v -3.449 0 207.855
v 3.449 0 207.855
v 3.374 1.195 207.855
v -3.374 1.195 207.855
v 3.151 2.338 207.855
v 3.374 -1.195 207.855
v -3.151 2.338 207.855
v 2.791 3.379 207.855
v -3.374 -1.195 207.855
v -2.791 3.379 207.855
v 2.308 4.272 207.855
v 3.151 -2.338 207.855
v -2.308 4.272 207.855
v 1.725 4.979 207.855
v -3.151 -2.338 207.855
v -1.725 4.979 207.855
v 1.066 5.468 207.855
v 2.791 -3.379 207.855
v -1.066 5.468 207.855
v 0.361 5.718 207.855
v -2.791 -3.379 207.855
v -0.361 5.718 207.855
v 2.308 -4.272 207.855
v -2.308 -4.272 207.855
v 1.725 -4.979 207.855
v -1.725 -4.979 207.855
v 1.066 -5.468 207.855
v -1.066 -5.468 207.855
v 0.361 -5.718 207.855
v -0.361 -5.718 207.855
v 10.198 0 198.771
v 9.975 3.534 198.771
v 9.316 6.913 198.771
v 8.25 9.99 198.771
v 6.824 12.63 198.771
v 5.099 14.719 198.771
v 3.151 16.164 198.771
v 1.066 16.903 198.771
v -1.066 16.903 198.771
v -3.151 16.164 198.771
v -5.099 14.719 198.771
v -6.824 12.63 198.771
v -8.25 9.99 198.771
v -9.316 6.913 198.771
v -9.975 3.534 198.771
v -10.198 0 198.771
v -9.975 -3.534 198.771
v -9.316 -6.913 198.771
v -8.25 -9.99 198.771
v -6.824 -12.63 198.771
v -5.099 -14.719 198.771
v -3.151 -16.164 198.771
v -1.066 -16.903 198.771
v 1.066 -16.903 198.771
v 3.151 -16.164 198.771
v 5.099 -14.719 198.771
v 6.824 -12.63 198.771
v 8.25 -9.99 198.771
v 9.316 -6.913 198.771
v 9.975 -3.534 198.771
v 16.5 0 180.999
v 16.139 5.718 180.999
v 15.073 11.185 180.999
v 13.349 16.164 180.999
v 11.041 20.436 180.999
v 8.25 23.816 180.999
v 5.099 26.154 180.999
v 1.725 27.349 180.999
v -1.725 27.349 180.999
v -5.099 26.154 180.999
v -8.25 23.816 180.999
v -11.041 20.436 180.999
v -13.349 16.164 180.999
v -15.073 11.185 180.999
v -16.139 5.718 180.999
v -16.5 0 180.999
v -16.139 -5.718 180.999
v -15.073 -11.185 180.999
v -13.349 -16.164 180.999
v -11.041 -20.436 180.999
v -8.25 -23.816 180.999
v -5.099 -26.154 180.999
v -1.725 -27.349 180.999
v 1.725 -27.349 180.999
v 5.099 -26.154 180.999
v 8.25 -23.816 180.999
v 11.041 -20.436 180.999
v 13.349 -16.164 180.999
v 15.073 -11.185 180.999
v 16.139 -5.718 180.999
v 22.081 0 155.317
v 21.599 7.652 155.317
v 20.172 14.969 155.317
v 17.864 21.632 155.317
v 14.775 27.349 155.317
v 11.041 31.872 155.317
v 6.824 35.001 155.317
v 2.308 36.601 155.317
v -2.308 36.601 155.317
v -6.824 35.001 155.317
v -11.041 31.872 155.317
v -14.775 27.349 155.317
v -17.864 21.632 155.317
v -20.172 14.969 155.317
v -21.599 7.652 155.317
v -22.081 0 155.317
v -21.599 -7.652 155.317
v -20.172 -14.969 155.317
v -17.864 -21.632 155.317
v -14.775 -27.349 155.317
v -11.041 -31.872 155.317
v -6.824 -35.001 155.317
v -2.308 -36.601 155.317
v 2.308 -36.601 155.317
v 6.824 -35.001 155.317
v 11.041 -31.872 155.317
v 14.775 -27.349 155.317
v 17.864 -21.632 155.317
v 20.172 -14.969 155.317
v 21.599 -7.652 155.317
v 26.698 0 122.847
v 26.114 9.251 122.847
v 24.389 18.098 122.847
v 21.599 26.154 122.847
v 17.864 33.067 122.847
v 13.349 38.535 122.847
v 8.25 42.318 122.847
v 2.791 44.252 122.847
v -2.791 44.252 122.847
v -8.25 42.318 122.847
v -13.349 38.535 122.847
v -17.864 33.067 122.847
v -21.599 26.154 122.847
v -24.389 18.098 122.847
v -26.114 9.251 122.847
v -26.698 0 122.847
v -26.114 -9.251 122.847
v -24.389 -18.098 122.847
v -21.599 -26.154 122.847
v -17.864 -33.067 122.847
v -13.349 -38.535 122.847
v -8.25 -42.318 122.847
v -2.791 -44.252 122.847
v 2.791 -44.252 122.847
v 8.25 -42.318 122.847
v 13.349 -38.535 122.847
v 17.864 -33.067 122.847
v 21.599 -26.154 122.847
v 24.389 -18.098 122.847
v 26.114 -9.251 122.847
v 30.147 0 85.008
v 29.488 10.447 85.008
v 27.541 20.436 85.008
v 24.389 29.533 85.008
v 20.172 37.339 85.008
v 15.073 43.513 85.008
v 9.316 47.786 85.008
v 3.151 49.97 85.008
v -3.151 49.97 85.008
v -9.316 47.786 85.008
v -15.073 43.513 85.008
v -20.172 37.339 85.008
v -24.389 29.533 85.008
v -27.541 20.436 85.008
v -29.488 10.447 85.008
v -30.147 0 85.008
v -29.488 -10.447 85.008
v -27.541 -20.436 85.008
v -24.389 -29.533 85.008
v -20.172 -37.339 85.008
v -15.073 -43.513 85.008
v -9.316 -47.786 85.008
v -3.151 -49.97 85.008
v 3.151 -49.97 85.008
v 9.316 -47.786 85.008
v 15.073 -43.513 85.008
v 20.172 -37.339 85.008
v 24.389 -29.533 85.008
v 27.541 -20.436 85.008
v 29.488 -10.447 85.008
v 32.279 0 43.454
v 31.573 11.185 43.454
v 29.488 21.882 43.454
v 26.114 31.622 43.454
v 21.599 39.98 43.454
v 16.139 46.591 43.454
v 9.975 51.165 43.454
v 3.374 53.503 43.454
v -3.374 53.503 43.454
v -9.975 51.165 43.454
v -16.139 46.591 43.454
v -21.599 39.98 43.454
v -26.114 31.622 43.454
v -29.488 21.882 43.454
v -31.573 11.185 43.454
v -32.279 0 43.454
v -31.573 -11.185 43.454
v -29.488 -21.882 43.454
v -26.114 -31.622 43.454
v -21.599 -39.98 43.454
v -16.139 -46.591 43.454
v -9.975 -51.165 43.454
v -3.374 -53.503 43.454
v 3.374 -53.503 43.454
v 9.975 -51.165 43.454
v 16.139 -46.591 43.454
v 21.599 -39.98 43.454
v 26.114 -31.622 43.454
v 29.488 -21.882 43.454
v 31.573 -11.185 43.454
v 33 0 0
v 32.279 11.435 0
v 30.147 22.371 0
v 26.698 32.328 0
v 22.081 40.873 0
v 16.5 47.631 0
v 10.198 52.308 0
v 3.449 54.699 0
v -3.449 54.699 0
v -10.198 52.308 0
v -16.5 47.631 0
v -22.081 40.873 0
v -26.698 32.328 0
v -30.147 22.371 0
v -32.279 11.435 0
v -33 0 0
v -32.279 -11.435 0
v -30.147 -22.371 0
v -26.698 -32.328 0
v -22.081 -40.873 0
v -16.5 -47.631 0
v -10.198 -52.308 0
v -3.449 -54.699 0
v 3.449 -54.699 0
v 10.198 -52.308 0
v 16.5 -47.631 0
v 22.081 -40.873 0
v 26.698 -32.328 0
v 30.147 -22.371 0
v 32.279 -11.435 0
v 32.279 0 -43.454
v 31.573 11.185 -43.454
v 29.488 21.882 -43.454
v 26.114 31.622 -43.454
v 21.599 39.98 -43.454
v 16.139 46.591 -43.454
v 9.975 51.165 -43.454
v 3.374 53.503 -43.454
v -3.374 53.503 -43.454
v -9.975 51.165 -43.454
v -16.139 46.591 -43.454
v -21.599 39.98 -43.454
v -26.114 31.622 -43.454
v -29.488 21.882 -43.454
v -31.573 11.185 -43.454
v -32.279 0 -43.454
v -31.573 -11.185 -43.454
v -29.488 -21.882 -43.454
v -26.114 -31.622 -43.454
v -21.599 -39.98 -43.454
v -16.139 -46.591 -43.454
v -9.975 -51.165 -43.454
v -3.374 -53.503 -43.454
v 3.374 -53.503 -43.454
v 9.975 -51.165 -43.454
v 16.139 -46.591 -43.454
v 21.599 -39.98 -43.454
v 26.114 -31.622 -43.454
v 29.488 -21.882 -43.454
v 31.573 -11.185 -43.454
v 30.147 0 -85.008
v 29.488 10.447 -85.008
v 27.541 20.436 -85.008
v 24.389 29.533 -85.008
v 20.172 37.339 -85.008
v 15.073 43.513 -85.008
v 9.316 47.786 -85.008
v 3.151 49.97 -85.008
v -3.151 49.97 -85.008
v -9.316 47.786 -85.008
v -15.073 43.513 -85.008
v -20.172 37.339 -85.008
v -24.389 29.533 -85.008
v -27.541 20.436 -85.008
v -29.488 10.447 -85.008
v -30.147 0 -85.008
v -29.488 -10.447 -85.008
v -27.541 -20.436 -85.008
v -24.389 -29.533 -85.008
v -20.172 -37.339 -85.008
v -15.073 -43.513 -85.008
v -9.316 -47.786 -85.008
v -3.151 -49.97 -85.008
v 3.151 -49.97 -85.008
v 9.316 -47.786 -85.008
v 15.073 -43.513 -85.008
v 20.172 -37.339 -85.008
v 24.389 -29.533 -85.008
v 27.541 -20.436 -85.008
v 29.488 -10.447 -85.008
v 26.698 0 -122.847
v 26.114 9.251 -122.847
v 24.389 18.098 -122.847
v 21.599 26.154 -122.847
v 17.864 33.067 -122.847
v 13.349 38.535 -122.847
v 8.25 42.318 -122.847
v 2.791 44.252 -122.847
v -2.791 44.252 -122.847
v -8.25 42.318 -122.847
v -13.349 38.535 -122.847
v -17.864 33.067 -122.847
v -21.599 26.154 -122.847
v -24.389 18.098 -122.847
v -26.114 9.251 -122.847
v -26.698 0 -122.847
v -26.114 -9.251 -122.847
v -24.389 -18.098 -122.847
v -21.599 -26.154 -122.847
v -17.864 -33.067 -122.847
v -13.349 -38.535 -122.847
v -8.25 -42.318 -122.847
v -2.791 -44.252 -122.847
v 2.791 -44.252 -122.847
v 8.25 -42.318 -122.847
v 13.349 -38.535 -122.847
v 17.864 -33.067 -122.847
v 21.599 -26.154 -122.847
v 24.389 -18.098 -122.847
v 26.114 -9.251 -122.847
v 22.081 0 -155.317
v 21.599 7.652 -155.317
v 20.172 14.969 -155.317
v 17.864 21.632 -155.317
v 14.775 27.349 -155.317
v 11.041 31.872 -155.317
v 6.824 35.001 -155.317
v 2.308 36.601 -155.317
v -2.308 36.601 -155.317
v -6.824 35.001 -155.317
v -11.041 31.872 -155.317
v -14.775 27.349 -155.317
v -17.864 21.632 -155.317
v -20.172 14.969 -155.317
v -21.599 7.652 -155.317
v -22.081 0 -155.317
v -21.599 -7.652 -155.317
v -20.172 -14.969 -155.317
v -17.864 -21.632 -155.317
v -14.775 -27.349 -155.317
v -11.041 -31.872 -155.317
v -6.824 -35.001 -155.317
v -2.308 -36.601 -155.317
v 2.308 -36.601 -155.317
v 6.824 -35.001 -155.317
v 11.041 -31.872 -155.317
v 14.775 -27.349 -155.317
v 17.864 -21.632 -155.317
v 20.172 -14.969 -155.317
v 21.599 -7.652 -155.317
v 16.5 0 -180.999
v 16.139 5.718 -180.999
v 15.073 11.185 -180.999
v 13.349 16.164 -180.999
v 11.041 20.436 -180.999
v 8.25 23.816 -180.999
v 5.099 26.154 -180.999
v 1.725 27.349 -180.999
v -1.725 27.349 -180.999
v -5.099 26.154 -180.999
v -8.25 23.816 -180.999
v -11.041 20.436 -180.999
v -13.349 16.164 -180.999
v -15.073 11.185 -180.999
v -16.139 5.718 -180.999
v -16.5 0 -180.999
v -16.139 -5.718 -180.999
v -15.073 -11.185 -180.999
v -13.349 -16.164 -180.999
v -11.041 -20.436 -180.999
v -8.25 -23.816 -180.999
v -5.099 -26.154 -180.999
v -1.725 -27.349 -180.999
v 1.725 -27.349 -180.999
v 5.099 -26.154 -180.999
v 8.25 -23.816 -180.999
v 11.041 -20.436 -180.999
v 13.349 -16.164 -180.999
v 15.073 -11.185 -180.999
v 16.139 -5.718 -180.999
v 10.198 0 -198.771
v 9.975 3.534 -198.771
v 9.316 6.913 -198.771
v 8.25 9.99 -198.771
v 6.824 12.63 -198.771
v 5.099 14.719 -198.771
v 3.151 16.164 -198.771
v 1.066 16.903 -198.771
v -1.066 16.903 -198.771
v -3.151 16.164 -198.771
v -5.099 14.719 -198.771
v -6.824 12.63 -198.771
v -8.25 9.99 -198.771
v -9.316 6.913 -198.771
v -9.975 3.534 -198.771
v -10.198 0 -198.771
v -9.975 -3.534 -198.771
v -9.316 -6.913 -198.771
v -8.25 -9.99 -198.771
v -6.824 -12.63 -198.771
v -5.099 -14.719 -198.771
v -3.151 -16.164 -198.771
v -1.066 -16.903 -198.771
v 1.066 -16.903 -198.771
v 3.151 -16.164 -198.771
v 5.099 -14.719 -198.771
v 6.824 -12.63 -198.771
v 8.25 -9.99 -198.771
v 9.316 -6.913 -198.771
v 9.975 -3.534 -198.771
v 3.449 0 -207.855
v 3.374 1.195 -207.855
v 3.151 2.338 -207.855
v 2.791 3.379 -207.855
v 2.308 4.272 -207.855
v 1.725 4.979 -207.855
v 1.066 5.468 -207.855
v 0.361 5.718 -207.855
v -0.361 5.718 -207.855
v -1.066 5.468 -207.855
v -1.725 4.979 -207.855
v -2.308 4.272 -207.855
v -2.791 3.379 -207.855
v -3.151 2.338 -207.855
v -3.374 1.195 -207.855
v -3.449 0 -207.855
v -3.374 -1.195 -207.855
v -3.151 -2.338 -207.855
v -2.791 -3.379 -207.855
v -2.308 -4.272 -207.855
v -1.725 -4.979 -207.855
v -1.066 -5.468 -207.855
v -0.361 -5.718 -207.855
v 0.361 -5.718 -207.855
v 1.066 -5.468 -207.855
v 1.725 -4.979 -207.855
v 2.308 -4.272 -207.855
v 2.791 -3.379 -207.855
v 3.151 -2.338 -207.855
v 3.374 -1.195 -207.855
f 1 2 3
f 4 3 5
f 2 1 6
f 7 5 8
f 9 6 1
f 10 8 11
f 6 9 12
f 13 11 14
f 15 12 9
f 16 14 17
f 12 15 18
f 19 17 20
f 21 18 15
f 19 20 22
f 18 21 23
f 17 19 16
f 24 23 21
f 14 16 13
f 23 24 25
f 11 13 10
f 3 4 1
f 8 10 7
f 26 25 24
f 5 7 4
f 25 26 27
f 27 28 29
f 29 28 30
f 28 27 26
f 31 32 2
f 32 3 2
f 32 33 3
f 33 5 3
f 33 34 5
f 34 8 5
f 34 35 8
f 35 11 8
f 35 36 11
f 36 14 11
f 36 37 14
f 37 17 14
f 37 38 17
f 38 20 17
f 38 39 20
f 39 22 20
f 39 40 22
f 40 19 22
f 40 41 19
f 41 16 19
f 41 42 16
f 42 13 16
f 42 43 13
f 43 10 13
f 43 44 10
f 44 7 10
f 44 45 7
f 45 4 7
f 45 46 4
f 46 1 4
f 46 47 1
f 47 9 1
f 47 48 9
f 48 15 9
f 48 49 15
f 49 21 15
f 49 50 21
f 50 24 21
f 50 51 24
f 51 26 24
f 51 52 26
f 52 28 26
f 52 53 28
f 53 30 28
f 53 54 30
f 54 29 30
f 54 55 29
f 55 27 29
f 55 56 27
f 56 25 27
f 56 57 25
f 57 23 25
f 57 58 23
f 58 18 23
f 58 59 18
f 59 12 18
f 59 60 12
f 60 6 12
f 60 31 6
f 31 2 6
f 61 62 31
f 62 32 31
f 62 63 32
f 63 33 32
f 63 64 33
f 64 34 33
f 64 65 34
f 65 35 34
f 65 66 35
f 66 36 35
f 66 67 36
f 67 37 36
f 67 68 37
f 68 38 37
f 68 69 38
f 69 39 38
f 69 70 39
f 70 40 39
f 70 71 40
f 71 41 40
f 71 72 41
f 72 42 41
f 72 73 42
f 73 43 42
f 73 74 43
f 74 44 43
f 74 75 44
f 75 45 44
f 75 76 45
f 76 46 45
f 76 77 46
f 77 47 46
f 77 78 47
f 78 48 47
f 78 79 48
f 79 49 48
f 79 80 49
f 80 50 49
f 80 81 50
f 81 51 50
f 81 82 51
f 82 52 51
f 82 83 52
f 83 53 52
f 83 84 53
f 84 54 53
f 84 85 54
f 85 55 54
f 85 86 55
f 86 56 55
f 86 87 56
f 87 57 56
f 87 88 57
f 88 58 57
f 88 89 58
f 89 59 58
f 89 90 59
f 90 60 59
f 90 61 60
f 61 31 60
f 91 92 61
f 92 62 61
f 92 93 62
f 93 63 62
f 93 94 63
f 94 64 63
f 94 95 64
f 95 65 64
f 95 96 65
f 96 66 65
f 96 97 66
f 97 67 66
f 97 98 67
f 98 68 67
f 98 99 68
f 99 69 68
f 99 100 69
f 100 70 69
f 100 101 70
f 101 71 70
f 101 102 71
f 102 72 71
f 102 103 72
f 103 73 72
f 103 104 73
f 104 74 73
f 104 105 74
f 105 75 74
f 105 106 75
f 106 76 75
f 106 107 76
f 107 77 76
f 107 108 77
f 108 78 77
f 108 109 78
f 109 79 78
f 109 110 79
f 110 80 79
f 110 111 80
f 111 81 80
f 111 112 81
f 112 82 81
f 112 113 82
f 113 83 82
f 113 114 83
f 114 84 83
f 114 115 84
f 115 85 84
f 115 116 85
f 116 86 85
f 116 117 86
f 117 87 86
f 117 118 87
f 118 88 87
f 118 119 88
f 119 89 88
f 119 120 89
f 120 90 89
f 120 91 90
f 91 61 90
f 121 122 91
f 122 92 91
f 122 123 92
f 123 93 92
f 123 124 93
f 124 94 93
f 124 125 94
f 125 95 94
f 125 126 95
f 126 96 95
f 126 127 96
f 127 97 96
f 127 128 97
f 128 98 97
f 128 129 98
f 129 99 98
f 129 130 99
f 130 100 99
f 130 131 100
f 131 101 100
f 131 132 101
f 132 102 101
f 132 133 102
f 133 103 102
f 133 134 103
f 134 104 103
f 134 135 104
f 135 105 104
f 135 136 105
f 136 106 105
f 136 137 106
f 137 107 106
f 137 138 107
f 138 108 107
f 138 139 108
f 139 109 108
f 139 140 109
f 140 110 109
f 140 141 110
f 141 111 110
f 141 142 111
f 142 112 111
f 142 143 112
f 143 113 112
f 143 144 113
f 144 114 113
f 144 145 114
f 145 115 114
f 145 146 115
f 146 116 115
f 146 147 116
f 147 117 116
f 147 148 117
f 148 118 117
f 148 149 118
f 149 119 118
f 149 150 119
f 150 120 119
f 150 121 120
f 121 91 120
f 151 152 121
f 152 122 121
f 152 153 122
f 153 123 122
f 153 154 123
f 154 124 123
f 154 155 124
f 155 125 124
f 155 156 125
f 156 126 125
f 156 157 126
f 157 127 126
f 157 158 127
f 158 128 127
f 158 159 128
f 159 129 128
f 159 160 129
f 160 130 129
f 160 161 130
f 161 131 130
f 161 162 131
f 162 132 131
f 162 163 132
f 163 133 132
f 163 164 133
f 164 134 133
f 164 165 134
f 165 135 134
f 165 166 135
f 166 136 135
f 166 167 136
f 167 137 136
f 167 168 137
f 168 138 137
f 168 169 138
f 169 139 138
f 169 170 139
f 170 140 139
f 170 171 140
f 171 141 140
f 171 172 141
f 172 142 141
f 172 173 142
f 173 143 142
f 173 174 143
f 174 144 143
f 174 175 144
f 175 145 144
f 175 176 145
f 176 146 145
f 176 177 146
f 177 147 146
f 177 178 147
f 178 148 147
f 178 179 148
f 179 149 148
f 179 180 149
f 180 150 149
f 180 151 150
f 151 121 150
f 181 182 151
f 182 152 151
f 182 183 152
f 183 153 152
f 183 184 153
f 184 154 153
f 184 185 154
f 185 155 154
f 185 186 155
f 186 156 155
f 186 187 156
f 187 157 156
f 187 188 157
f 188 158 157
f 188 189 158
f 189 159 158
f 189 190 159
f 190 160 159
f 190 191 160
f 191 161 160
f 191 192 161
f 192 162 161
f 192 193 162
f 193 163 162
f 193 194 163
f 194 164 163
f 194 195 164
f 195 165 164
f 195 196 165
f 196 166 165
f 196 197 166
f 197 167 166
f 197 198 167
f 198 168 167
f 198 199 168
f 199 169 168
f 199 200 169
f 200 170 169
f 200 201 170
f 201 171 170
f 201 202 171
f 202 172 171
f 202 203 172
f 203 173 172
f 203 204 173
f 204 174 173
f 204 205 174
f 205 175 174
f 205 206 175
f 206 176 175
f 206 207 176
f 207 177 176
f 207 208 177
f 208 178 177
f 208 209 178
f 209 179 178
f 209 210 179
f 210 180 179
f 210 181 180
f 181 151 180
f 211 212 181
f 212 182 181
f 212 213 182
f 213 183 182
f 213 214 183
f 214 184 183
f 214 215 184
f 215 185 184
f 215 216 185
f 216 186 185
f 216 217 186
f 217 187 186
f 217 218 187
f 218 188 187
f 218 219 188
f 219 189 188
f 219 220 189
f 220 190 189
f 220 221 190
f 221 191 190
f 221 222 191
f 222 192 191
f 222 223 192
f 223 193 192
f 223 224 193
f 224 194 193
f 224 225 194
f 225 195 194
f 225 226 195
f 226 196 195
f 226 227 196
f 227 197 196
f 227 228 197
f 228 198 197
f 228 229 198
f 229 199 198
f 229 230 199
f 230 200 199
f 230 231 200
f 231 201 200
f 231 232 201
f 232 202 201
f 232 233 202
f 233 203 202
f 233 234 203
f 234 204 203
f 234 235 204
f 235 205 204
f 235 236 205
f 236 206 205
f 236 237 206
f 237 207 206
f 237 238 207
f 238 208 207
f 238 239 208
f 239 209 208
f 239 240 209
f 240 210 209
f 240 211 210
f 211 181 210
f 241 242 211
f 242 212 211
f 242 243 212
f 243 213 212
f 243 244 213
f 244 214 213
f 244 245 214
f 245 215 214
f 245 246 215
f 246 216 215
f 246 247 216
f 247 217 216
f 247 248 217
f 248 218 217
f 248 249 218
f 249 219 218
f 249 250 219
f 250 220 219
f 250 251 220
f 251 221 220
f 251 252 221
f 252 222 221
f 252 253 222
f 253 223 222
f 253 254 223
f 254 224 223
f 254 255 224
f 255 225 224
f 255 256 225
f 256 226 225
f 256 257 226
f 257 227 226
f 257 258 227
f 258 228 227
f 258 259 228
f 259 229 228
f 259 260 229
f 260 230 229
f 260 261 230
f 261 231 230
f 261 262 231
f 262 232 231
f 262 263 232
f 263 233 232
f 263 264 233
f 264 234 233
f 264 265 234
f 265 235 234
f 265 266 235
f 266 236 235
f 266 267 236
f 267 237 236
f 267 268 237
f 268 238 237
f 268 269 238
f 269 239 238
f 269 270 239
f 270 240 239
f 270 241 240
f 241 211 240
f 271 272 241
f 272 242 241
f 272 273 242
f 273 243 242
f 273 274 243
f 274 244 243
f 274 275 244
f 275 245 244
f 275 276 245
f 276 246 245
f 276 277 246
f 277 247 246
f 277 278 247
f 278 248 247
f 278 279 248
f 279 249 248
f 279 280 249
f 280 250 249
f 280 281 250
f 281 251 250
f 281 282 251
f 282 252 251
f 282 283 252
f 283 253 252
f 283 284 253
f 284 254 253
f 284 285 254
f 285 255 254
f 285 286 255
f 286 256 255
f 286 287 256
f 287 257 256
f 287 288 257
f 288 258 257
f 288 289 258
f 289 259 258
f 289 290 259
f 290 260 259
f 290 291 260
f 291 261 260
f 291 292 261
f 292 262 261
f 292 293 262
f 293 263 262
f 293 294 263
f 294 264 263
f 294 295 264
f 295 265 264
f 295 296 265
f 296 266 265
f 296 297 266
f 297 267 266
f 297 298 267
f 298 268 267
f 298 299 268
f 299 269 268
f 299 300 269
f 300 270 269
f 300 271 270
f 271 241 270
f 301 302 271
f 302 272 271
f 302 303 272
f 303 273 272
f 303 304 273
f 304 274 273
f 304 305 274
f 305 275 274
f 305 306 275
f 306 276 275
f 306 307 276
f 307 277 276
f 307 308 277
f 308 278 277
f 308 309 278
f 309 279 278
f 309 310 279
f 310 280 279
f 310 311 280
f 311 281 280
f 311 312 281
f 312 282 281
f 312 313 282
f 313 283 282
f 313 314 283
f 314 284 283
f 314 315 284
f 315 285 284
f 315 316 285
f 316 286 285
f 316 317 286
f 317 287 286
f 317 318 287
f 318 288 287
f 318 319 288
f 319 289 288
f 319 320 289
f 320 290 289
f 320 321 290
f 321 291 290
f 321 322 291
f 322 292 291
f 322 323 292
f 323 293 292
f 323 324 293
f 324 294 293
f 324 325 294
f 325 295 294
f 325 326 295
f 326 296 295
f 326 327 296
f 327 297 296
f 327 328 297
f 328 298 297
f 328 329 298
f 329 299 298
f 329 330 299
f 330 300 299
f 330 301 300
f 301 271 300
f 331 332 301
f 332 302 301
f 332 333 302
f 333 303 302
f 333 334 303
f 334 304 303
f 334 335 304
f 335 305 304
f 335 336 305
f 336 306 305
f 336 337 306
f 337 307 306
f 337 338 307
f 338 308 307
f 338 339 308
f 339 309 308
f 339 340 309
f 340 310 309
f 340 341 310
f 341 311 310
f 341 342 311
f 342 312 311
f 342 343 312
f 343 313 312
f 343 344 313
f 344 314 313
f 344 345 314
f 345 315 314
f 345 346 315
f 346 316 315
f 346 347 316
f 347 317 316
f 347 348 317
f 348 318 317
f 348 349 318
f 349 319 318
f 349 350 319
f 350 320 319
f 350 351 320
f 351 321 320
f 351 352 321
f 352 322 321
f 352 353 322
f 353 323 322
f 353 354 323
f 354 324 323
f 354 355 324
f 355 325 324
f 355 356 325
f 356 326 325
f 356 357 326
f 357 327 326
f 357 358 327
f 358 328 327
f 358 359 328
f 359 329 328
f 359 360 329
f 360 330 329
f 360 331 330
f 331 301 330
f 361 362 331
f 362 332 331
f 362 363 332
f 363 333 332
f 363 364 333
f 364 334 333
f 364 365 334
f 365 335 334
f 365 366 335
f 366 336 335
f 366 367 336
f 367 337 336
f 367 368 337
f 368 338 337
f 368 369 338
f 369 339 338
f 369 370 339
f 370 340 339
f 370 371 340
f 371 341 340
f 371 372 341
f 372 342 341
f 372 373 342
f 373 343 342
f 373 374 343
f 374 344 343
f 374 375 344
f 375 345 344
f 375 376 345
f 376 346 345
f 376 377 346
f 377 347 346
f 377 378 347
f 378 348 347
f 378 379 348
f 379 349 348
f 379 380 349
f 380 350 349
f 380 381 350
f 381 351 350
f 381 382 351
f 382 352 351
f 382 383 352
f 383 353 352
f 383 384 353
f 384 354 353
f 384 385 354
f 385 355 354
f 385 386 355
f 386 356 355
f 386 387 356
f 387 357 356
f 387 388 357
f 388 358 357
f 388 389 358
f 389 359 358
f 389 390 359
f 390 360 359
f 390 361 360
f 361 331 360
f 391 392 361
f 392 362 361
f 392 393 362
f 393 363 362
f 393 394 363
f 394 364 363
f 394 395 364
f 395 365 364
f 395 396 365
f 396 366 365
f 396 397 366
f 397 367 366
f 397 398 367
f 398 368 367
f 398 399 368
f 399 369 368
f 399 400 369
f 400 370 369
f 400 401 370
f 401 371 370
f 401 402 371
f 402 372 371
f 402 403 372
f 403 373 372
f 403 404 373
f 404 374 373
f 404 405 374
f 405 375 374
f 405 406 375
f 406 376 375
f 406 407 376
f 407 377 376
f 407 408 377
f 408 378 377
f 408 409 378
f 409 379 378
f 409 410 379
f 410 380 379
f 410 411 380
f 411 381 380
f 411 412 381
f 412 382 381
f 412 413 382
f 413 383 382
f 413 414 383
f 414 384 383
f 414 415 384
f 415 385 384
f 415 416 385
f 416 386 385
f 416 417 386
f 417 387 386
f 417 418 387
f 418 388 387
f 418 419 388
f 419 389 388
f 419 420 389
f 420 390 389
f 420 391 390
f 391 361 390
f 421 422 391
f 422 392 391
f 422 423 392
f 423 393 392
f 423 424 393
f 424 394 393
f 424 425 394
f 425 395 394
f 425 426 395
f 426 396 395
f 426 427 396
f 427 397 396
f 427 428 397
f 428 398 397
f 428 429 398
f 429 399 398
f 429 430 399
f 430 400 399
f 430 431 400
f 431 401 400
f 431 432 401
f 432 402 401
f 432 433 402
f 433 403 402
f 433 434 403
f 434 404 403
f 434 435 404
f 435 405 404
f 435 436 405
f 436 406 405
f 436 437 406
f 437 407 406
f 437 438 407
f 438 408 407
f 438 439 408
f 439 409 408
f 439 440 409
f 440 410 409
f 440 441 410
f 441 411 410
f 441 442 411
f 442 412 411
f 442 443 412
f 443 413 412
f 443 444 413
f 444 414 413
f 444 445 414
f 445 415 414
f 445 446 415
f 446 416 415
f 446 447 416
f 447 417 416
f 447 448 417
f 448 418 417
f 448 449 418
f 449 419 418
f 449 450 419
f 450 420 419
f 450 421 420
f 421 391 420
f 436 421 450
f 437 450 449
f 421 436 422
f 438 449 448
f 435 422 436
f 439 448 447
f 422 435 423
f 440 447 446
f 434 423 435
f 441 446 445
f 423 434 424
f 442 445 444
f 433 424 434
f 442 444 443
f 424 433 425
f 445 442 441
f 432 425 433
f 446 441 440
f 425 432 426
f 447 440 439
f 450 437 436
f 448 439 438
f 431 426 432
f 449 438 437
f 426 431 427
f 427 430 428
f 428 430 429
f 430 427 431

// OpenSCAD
// Generated by SolidPython 1.0.1 on 2020-07-29 00:46:45


scale(v = [3, 5, 19]) {
	sphere(r = 11);
}
/***********************************************
*********      SolidPython code:      **********
************************************************
 
# import packages: SolidPython
from solid import *
from solid.utils import *
from itertools import chain, combinations, permutations


class Resize:

    def __init__(self, scad_file):
        self.scad_file = scad_file
        #self.scad_file = import_scad(scad_file)
        # cone/cylinder param:
        self.r1 = 0
        self.r2 = 0
        self.h = 0
        # rectangular prism param:
        self.w = 0
        self.l = 0
        # ellipse param:
        self.r = 0

    # import OpenScad code (file name corresponds to shape)


    # classify shape + parameters
    def assign(self, param1, param2, param3):
        if self.scad_file == 'cone.scad':
            self.r1 = param1
            self.r2 = param2
            self.h = param3
        elif self.scad_file == 'cylinder.scad':
            self.r1 = param1
            self.r2 = param2
            self.h = param3
        elif self.scad_file == 'rectangularPrism.scad':
            self.h = param1
            self.l = param2
            self.w = param3
        else:
            self.r = param1
            self.h = param2

    # resize parameters
    def iterate(self):
        x = range(3, 20, 2)
        i = 1
        if self.scad_file == 'cone.scad':
            tempList = list(permutations(x, 2))
            for temp in tempList:
                param1 = temp[0]
                param2 = temp[1]
                filepath = 'produced_scad_files/' + 'cone' + str(param1) + '_' + str(param2) + '_' + '.scad'
                scad_render_to_file(cylinder(h=param1, r1=param2, r2=0), filepath)

        elif self.scad_file == 'cylinder.scad':
            tempList = list(permutations(x, 3))
            for temp in tempList:
                param1 = temp[0]
                param2 = temp[1]
                filepath = 'produced_scad_files/' + 'cylinder' + str(param1) + '_' + str(param2) + '_' + '.scad'
                scad_render_to_file(cylinder(h=param1, r1=param2, r2=param2), filepath)

        elif self.scad_file == 'rectangularPrism.scad':
            tempList = list(permutations(x, 3))
            for temp in tempList:
                param1 = temp[0]
                param2 = temp[1]
                param3 = temp[2]
                filepath = 'produced_scad_files/' + 'rectangularPrism' + str(param1) + '_' + str(param2) + '_' + str(
                    param3) + '.scad'
                scad_render_to_file(cube(size=(param1, param2, param3)), filepath)

        elif self.scad_file == 'ellipse.scad':
            tempList = list(permutations(x, 4))
            for temp in tempList:
                param1 = temp[0]
                param2 = temp[1]
                param3 = temp[2]
                param4 = temp[3]
                filepath = 'produced_scad_files/' + 'ellipse' + str(param1) + '_' + str(param2) + '_' + str(param3) + '_' + str(param4) + '.scad'
                scad_render_to_file(scale([param1, param2, param3])(sphere(r=param4)), filepath)

    def render_to_scadfile(self):
        scad_render_to_file(scad, 'example.scad') 
 
************************************************/
